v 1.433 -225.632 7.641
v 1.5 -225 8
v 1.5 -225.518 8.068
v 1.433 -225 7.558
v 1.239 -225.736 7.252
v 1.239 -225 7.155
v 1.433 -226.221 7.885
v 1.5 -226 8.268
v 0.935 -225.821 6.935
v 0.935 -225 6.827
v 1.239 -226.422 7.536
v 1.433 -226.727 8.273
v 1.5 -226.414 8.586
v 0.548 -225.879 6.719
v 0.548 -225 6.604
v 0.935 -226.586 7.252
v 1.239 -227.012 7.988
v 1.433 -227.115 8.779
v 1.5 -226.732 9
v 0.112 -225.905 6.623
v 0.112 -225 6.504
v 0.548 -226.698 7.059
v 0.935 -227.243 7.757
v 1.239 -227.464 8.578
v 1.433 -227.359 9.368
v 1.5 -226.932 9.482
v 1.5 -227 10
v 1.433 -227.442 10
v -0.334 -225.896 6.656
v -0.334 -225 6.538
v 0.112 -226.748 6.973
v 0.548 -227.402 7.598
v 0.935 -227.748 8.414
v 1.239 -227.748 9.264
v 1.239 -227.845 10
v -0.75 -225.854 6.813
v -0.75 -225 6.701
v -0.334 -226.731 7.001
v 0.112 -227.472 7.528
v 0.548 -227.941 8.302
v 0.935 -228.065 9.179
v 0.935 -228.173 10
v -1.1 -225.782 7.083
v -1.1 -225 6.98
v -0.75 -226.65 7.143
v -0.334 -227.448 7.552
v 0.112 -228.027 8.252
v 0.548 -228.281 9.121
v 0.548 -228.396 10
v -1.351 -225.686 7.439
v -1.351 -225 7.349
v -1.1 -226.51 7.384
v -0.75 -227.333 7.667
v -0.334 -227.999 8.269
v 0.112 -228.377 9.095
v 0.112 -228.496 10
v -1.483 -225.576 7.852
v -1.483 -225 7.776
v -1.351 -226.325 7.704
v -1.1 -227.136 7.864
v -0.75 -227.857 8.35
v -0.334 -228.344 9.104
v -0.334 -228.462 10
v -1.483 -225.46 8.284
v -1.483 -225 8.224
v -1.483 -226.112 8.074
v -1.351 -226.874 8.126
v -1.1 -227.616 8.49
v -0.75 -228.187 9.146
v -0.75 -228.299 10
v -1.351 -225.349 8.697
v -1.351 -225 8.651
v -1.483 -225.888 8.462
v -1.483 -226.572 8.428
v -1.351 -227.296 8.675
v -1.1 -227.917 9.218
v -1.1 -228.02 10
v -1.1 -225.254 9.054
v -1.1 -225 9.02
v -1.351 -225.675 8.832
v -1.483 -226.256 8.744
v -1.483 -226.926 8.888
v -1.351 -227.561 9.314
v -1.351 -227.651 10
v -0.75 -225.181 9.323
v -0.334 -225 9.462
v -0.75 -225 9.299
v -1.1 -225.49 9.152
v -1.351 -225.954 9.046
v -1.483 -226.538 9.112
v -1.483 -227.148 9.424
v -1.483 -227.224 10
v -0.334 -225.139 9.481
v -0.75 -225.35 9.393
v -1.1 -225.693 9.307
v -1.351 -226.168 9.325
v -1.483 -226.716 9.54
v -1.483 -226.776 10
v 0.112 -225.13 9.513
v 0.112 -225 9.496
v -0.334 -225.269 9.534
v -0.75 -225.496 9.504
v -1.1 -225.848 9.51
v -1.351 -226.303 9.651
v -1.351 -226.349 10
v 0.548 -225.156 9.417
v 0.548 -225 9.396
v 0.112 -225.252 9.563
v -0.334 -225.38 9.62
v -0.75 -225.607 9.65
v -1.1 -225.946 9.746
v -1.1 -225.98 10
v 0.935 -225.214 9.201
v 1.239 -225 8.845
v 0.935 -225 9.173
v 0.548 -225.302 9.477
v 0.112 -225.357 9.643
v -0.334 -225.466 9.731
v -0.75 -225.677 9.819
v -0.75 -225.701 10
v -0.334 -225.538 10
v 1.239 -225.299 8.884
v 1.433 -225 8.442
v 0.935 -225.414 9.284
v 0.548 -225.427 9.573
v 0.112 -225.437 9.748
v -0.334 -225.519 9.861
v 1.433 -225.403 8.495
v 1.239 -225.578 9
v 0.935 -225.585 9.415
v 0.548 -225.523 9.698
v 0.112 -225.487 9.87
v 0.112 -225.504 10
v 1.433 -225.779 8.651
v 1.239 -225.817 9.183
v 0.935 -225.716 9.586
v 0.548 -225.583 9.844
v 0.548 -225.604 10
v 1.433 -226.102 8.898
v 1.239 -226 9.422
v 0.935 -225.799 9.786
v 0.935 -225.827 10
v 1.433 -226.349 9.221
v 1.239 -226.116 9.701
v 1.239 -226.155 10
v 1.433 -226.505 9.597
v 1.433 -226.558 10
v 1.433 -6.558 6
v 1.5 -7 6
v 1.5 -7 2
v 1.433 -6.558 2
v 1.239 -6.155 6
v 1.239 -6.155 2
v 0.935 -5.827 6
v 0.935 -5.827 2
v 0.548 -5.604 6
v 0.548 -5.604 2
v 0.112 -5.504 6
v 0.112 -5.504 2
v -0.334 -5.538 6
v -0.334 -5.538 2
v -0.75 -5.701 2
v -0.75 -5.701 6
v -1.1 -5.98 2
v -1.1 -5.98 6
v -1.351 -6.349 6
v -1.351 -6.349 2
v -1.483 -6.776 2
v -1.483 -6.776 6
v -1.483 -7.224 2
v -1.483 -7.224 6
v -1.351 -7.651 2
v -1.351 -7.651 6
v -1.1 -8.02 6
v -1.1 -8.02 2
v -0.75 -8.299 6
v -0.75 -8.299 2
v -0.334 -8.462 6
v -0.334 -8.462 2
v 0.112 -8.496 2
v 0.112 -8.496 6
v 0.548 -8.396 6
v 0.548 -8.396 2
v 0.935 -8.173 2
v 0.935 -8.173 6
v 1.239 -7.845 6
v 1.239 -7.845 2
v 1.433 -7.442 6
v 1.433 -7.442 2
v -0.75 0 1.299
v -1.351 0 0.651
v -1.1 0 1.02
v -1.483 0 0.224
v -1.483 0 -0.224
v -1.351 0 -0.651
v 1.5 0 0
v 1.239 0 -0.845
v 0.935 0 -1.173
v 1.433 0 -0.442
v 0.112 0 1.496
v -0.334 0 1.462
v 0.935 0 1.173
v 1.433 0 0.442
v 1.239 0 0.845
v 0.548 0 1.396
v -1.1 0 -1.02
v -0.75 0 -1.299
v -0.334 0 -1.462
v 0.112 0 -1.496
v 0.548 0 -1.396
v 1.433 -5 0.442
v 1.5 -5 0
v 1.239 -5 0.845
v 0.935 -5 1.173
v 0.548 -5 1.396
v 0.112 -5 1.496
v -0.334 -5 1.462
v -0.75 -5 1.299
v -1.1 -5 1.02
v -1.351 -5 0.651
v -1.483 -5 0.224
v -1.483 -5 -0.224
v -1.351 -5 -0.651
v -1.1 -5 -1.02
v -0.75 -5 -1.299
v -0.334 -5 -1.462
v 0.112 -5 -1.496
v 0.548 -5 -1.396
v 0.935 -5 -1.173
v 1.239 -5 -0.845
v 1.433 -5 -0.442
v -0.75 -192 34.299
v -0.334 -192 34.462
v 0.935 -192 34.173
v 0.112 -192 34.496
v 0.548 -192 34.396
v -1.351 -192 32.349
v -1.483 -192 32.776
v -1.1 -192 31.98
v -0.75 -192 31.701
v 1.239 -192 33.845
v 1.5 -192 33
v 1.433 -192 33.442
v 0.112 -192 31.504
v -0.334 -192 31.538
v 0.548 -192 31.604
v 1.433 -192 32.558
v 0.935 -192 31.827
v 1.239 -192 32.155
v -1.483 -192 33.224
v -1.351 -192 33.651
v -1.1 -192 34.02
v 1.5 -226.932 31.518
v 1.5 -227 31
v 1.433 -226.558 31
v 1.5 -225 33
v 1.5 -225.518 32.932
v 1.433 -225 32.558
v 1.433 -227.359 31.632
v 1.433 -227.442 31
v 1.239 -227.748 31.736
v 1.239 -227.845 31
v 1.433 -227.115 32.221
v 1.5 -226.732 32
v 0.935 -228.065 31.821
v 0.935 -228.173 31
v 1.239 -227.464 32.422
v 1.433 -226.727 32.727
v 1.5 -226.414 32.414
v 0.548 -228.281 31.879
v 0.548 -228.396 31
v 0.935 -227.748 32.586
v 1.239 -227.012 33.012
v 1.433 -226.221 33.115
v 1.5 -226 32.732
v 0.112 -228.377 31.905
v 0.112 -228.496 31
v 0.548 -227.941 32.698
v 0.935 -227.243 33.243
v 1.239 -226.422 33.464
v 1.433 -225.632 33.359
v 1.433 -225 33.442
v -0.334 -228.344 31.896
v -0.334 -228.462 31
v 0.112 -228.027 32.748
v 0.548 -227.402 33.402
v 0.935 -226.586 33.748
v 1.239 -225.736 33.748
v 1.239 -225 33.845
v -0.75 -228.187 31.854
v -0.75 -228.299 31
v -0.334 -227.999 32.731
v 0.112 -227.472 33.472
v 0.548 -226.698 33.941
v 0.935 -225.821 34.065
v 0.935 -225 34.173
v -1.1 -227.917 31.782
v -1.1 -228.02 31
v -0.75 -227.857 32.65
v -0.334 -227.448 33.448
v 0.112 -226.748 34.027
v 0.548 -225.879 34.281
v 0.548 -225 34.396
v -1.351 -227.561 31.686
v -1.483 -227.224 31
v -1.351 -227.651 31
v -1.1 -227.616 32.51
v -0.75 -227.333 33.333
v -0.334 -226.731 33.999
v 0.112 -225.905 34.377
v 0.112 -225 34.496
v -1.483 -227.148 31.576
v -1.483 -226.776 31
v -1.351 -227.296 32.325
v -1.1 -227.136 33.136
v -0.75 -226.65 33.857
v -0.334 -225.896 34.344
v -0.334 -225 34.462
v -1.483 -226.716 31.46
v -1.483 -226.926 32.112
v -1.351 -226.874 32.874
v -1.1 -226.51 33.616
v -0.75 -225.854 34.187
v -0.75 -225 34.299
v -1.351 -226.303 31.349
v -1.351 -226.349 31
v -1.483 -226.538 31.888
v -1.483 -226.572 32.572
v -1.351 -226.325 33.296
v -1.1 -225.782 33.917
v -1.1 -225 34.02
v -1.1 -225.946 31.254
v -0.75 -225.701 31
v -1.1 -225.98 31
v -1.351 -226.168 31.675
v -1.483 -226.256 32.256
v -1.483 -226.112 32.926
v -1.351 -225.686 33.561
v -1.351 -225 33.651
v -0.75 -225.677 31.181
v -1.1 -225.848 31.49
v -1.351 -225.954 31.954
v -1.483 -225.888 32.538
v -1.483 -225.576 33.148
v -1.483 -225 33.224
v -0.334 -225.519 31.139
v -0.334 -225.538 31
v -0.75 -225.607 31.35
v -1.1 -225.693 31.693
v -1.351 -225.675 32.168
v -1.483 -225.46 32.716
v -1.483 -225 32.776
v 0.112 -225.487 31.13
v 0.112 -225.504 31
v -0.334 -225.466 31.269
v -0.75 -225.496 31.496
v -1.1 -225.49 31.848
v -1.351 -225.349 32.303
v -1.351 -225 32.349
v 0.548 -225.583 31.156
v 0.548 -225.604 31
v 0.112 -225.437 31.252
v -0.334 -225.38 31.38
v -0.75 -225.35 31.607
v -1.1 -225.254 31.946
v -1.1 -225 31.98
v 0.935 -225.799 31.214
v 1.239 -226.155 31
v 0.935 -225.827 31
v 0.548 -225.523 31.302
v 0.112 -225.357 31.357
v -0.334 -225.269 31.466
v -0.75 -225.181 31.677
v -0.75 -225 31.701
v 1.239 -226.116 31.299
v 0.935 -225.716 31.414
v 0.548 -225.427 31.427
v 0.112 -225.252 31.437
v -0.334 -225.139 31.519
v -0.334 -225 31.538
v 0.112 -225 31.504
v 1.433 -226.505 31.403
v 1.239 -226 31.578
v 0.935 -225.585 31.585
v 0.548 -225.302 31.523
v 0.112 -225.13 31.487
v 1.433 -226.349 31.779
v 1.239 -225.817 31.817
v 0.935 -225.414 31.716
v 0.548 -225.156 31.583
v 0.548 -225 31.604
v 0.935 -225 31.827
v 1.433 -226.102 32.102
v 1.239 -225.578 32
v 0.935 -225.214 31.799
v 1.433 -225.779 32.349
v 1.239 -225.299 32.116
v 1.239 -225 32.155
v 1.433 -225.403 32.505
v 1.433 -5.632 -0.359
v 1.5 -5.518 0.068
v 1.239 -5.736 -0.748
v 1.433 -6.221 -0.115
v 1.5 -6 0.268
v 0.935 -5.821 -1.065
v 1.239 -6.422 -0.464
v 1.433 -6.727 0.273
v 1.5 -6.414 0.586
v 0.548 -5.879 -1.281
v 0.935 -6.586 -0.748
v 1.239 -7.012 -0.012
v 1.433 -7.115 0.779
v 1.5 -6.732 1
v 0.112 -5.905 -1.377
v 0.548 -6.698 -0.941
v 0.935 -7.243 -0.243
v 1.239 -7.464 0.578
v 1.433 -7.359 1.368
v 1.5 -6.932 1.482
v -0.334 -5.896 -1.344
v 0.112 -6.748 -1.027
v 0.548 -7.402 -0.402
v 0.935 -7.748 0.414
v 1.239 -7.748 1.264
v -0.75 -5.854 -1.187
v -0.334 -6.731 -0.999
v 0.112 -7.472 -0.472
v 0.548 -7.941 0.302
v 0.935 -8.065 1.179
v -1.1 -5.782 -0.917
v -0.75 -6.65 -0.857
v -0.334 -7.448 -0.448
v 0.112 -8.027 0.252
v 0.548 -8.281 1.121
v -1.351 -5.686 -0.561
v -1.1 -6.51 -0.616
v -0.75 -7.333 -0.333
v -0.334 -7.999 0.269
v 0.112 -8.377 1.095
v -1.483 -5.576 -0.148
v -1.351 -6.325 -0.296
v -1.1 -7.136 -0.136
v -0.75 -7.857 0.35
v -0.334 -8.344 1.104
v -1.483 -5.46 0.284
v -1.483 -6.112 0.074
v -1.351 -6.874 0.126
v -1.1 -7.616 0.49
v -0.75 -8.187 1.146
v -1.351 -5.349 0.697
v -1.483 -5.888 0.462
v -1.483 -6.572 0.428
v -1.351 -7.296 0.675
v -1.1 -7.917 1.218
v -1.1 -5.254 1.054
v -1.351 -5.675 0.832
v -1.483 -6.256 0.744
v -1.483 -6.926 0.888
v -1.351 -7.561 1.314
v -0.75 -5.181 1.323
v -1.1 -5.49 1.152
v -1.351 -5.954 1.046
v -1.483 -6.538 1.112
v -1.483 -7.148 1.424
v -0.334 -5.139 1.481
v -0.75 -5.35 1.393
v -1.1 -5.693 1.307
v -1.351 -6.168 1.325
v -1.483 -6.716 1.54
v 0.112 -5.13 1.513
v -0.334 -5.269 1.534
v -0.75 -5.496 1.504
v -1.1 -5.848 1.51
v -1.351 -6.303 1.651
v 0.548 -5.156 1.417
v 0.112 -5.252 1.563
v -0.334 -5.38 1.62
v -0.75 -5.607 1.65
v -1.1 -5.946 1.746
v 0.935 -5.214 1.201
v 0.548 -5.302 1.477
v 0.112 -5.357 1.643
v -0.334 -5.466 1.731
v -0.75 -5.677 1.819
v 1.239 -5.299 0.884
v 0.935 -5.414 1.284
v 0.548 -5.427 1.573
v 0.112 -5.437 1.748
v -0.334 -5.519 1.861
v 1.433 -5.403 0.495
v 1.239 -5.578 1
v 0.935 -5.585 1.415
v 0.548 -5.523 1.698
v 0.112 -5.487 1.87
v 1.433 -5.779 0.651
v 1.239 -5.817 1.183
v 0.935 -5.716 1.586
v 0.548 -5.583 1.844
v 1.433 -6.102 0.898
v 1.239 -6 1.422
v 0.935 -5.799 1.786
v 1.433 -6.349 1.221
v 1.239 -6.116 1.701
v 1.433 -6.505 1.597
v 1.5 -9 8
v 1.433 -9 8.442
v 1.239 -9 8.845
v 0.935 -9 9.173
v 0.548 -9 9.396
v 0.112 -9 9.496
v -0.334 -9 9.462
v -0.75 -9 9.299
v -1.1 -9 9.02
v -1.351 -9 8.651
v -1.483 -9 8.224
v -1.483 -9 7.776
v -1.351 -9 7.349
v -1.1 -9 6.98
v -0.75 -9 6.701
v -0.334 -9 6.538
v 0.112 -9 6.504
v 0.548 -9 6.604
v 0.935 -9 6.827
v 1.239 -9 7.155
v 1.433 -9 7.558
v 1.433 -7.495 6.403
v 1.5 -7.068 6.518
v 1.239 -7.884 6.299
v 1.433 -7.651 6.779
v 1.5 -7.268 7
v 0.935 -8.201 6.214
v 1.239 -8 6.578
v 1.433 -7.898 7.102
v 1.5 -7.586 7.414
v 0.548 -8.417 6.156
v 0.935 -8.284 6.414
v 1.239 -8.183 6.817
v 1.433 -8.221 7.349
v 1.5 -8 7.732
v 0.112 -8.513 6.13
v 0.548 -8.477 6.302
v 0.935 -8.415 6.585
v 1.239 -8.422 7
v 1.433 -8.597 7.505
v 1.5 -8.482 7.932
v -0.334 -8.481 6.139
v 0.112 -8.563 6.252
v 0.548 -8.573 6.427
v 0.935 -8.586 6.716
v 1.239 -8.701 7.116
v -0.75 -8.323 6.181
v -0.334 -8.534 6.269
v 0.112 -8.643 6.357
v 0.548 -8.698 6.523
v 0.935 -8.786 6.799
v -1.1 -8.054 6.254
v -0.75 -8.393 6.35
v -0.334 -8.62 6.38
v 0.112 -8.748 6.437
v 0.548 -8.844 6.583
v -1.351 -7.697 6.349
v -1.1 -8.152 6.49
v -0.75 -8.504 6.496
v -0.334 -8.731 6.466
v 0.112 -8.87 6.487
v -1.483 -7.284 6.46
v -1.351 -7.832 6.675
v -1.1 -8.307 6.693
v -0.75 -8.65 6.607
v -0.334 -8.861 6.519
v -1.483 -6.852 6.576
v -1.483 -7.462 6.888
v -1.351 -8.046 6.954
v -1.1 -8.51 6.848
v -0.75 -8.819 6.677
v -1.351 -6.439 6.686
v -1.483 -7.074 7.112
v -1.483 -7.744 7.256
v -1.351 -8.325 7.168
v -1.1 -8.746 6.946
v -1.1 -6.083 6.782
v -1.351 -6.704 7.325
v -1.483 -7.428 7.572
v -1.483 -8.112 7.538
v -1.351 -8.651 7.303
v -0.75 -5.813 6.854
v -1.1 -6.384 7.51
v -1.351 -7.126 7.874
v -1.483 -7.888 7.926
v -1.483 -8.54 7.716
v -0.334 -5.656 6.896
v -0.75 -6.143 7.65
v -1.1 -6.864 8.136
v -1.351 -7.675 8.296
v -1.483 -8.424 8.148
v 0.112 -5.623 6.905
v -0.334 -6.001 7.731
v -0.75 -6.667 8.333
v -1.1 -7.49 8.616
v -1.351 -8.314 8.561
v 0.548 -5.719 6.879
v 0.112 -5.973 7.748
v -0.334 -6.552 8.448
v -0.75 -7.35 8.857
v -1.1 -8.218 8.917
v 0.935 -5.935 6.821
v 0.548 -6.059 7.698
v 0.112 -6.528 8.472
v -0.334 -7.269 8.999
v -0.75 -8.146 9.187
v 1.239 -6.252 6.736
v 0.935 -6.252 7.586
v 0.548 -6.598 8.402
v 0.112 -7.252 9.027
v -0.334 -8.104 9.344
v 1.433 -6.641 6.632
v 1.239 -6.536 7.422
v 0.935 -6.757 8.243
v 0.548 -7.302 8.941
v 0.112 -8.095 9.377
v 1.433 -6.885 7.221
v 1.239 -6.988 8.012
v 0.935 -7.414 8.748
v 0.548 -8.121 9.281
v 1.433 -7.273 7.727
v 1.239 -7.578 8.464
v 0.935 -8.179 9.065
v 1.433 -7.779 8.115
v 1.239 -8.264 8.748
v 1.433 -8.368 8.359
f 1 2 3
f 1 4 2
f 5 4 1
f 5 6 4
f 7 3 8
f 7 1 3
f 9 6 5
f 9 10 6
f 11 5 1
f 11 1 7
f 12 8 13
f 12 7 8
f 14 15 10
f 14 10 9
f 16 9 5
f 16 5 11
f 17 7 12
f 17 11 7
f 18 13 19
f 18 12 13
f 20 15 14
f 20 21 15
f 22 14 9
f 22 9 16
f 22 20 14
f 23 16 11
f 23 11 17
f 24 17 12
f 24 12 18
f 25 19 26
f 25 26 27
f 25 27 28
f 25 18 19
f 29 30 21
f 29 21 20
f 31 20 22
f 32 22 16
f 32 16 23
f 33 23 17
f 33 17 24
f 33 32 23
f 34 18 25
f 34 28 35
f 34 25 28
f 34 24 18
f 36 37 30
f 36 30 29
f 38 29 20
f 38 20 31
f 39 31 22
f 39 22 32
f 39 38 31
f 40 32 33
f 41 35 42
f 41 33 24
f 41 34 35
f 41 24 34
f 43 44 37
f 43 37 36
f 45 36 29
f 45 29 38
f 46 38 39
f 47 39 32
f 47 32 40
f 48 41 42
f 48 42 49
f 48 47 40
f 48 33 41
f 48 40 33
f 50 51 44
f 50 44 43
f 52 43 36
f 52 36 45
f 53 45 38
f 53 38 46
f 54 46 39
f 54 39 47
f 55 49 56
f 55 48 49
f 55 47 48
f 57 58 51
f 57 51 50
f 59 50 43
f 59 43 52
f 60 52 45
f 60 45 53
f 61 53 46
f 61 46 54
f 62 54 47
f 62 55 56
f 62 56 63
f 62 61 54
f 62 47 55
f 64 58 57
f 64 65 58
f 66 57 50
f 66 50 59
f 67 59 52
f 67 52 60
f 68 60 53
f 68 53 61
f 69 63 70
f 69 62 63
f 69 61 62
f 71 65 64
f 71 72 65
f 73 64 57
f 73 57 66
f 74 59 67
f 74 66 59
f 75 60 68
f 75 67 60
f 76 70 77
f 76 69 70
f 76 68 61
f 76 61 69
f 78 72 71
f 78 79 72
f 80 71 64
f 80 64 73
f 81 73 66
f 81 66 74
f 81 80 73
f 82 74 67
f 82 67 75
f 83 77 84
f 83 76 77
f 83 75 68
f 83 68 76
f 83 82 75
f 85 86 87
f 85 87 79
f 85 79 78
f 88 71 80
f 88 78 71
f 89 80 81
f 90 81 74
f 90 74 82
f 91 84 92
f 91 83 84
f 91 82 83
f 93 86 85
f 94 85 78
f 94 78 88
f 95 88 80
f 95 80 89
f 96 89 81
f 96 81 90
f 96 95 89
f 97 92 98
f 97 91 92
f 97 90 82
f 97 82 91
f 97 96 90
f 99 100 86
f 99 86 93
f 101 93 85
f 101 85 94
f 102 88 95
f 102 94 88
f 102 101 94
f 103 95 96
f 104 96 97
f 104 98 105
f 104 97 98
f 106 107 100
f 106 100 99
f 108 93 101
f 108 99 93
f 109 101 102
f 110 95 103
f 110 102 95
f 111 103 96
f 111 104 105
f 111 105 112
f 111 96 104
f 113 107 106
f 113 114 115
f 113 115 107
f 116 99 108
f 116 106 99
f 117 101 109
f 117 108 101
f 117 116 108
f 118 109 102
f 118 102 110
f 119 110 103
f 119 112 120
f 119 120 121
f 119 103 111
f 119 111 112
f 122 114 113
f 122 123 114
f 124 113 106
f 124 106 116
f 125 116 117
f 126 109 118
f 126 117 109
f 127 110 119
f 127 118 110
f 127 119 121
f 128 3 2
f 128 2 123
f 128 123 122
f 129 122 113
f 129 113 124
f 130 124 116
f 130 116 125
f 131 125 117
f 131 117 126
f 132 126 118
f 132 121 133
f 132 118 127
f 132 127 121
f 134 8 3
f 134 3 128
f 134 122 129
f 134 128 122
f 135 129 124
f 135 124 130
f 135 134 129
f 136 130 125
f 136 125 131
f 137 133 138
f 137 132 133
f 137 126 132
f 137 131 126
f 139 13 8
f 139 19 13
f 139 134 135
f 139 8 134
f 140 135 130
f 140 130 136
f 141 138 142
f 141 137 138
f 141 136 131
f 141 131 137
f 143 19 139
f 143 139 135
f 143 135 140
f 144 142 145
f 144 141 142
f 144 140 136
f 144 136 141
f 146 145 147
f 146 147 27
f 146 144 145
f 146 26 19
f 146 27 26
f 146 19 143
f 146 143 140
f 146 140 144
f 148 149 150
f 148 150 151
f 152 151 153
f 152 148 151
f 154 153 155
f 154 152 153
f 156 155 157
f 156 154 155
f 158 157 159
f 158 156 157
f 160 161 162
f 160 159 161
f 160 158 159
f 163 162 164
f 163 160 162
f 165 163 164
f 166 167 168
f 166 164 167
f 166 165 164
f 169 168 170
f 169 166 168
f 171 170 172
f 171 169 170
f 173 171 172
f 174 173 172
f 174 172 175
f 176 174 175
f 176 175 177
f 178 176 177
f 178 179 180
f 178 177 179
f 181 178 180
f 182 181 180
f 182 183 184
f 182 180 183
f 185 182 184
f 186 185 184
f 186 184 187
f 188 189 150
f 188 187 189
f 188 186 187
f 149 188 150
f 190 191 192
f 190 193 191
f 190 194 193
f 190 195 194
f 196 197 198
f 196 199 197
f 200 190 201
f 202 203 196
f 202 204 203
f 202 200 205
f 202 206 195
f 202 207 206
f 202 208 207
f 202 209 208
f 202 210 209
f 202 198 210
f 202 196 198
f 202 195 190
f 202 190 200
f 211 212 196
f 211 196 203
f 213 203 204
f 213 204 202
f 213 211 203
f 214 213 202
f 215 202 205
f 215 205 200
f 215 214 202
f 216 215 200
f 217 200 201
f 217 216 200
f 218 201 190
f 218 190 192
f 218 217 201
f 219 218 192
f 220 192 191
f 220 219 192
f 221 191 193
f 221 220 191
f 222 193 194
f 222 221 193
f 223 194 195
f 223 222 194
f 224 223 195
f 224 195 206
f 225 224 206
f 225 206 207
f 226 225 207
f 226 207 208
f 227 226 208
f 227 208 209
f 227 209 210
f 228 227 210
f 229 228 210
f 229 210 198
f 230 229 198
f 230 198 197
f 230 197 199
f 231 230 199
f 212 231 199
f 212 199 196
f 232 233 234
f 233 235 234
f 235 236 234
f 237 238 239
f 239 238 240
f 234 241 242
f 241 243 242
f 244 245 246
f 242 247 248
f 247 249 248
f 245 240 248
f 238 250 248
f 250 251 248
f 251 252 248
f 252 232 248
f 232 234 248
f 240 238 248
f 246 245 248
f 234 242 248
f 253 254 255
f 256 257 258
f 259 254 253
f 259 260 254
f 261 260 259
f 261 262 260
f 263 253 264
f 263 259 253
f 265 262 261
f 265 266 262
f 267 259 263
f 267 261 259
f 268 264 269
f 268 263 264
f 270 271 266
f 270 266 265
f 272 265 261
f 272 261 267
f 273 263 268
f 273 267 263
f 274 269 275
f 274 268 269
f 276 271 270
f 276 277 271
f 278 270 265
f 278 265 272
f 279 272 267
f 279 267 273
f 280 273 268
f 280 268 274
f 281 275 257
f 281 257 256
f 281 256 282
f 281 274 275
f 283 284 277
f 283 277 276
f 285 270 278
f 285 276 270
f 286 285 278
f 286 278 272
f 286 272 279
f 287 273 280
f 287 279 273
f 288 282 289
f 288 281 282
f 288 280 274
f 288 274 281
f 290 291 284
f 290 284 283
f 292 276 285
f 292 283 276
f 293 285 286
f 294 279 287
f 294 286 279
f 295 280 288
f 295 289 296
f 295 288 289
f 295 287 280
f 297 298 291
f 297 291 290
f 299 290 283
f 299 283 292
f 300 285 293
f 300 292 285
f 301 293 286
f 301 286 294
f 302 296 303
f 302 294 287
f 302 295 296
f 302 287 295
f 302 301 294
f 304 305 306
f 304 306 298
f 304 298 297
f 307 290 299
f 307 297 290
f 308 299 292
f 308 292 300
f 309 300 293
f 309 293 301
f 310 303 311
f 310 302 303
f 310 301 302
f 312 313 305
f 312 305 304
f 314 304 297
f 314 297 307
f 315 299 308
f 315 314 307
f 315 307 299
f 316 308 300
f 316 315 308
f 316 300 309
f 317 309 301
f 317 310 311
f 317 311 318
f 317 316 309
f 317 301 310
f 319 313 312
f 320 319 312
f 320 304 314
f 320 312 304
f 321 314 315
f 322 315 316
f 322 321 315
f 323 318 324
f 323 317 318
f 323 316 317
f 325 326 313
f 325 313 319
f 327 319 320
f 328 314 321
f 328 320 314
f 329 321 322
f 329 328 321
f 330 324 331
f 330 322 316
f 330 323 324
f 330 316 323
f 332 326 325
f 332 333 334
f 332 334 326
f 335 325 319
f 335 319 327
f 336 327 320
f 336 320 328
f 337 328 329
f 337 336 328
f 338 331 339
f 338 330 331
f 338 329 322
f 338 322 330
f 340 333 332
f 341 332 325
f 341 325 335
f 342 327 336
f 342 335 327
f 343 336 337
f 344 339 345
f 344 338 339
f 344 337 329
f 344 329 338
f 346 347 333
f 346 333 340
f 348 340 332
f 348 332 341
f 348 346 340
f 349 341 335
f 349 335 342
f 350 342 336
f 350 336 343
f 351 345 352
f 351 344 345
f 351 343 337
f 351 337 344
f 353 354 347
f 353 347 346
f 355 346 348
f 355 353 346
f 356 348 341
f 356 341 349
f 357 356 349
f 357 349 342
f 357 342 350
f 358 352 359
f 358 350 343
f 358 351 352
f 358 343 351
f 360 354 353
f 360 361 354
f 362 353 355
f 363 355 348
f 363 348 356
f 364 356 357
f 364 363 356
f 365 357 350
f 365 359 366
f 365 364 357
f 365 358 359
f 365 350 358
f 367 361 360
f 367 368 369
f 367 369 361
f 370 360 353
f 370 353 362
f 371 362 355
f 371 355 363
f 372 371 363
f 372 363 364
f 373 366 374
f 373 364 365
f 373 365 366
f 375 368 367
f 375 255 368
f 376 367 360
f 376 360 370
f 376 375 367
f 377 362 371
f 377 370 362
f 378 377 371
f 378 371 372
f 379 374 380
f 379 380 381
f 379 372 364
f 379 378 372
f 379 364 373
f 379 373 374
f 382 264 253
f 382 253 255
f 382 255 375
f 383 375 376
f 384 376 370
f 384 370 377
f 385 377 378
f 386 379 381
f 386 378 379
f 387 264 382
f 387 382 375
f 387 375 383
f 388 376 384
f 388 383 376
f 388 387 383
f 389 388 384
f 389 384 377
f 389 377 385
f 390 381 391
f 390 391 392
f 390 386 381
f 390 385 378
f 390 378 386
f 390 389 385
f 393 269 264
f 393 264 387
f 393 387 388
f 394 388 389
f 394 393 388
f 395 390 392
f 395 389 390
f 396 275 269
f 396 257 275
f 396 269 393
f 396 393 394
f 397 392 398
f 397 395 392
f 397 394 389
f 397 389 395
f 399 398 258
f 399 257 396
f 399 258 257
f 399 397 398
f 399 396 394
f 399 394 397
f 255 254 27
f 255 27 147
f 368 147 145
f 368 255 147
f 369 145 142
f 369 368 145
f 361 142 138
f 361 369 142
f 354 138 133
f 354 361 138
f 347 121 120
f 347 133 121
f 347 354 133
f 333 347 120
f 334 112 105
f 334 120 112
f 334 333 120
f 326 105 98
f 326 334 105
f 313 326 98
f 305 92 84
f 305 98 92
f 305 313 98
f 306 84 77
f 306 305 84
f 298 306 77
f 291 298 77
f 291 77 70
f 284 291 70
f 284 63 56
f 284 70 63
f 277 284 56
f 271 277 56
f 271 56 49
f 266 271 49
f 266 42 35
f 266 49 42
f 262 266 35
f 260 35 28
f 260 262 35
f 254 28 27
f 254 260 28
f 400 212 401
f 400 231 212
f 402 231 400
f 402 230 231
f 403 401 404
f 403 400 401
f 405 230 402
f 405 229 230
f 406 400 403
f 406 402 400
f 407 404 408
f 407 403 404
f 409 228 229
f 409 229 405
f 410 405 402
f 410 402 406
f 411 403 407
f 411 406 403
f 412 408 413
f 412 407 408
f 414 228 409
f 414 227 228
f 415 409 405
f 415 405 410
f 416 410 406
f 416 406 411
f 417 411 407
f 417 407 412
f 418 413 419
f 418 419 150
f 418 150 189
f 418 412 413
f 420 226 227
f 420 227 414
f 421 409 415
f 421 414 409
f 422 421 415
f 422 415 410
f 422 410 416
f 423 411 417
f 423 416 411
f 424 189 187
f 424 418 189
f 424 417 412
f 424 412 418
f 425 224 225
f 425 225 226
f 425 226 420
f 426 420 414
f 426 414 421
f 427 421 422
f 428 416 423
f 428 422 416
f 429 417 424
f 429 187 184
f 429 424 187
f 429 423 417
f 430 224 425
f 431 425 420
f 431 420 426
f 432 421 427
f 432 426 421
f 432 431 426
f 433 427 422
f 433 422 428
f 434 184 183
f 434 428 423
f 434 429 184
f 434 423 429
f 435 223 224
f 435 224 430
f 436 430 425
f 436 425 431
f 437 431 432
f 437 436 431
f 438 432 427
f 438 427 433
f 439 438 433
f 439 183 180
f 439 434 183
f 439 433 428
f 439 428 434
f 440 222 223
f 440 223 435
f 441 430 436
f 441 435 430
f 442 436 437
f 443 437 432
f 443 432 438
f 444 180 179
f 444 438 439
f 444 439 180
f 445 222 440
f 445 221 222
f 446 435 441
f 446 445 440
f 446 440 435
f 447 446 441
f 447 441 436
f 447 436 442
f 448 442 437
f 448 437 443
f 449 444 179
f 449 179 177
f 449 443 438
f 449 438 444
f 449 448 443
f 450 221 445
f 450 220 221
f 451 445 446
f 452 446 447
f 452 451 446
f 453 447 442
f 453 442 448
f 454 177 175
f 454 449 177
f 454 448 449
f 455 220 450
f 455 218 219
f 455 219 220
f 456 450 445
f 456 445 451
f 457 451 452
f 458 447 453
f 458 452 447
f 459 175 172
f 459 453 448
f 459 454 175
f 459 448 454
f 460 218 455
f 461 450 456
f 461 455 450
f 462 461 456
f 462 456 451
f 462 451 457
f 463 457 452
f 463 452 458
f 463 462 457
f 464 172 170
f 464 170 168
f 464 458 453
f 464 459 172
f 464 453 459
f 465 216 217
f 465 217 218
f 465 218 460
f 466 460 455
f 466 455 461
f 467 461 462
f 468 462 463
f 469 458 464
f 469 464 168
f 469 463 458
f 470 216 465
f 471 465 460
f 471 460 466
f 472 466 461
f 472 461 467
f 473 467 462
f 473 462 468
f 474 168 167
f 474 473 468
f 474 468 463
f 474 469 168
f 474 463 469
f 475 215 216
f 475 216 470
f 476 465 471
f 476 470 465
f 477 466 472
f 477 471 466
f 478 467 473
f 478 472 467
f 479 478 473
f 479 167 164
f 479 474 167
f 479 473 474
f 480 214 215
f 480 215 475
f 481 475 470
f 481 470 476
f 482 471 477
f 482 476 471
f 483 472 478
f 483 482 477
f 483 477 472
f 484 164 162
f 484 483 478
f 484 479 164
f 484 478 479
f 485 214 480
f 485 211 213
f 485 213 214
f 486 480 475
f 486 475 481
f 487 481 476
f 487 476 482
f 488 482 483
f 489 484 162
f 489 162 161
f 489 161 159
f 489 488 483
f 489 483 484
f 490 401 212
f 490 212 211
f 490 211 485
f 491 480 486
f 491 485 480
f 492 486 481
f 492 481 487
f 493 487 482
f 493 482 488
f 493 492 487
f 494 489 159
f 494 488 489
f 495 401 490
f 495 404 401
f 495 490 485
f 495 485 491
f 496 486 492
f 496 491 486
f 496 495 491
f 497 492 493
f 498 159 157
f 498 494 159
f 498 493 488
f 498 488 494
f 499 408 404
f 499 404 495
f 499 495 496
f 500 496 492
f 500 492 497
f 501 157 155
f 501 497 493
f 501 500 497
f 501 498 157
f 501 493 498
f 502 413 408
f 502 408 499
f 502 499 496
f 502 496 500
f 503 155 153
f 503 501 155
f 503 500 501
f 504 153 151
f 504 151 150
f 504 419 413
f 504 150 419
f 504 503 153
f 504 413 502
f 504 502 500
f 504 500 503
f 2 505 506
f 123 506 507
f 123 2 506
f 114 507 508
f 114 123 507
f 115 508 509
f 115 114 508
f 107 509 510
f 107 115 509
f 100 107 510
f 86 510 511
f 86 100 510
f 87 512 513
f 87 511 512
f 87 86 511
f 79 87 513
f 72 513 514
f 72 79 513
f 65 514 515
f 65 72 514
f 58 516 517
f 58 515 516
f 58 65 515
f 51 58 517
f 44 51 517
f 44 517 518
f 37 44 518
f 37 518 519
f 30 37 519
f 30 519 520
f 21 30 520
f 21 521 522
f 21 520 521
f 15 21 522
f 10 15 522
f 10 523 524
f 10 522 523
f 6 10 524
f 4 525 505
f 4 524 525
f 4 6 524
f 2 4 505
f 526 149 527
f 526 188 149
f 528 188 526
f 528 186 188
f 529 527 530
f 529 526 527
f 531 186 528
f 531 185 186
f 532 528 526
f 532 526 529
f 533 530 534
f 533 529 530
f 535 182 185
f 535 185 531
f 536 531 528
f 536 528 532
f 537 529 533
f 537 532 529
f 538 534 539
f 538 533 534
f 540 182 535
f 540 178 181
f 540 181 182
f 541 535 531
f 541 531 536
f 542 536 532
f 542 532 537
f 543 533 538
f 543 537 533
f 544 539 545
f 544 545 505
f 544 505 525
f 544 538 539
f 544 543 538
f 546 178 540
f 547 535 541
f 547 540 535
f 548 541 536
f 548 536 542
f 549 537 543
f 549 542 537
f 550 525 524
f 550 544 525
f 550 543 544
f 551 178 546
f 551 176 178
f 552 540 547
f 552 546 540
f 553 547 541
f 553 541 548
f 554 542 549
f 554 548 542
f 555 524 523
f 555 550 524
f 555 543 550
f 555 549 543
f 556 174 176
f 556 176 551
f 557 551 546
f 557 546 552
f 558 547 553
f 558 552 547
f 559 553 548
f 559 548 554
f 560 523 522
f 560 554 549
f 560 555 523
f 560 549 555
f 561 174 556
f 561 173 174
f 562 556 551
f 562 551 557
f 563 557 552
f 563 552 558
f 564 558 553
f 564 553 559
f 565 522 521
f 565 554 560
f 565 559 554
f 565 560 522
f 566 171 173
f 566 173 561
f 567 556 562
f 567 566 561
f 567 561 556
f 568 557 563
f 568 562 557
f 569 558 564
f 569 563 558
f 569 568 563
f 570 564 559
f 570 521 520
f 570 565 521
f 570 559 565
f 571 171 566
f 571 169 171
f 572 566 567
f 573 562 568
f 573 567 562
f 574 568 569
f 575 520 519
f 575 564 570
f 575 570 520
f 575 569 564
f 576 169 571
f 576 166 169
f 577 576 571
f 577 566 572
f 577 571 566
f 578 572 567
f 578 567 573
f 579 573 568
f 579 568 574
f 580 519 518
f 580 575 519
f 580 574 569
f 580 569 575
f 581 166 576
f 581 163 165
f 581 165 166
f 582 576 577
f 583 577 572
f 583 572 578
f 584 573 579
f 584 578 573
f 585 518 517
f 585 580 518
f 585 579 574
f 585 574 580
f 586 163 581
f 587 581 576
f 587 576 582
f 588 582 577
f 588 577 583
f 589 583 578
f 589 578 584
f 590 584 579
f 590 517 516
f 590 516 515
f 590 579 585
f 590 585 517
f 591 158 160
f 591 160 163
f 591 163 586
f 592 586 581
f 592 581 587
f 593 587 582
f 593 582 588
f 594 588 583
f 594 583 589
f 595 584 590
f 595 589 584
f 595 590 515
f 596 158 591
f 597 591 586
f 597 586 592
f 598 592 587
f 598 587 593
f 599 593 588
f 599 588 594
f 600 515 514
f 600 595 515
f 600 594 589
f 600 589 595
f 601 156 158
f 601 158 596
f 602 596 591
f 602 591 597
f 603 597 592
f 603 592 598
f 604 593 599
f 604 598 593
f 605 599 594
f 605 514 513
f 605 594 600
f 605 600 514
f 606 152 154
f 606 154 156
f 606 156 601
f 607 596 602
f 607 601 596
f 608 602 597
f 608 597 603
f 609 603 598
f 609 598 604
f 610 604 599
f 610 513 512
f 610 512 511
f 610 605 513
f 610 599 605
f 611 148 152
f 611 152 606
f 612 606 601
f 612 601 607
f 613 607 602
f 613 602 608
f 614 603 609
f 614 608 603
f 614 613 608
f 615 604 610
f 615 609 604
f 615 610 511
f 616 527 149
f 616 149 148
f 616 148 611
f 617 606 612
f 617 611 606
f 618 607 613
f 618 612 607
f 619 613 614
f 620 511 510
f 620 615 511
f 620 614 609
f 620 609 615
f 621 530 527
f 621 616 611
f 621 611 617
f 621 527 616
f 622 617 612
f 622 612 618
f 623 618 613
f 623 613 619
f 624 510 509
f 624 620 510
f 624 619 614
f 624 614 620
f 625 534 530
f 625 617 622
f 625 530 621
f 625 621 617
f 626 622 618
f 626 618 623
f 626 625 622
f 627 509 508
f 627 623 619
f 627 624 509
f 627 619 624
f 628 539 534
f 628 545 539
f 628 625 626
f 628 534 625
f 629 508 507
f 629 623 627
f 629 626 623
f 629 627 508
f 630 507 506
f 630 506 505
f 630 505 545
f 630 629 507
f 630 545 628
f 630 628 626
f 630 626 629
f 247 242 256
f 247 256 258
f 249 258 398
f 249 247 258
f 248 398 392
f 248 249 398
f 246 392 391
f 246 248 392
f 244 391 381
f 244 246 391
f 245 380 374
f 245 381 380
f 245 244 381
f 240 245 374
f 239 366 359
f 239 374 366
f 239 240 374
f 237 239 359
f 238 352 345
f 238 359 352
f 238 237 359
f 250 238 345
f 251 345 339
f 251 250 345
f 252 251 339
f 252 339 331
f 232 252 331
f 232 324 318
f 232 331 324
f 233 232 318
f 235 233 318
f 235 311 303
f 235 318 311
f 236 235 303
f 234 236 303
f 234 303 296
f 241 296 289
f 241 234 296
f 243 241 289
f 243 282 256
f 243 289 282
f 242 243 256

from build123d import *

# Parameters (mm, degrees)
SKETCH_3_R = 1.5


with BuildPart() as part:
    # По траектории1: sweep along a path in Эскиз1
    with BuildLine(Plane(origin=(0, 0, 0), x_dir=(0, 0, -1), z_dir=(1, 0, 0))) as sweep_1_path:
        Line((0, 0), (0, -5))
        ThreePointArc((0, -5), (-0.585786438, -6.414213562), (-2, -7))
        Line((-2, -7), (-6, -7))
        ThreePointArc((-6, -7), (-7.414213562, -7.585786438), (-8, -9))
        Line((-8, -9), (-8, -225))
        ThreePointArc((-8, -225), (-8.585786438, -226.414213562), (-10, -227))
        Line((-10, -227), (-31, -227))
        ThreePointArc((-31, -227), (-32.414213562, -226.414213562), (-33, -225))
        Line((-33, -225), (-33, -192))
    # Эскиз3 → По траектории1 (sweep)
    with BuildSketch(Plane(origin=(0, 0, 0), x_dir=(1, 0, 0), z_dir=(0, 1, 0))):
        Circle(SKETCH_3_R)
    sweep(path=sweep_1_path.line)


solid = part.part
